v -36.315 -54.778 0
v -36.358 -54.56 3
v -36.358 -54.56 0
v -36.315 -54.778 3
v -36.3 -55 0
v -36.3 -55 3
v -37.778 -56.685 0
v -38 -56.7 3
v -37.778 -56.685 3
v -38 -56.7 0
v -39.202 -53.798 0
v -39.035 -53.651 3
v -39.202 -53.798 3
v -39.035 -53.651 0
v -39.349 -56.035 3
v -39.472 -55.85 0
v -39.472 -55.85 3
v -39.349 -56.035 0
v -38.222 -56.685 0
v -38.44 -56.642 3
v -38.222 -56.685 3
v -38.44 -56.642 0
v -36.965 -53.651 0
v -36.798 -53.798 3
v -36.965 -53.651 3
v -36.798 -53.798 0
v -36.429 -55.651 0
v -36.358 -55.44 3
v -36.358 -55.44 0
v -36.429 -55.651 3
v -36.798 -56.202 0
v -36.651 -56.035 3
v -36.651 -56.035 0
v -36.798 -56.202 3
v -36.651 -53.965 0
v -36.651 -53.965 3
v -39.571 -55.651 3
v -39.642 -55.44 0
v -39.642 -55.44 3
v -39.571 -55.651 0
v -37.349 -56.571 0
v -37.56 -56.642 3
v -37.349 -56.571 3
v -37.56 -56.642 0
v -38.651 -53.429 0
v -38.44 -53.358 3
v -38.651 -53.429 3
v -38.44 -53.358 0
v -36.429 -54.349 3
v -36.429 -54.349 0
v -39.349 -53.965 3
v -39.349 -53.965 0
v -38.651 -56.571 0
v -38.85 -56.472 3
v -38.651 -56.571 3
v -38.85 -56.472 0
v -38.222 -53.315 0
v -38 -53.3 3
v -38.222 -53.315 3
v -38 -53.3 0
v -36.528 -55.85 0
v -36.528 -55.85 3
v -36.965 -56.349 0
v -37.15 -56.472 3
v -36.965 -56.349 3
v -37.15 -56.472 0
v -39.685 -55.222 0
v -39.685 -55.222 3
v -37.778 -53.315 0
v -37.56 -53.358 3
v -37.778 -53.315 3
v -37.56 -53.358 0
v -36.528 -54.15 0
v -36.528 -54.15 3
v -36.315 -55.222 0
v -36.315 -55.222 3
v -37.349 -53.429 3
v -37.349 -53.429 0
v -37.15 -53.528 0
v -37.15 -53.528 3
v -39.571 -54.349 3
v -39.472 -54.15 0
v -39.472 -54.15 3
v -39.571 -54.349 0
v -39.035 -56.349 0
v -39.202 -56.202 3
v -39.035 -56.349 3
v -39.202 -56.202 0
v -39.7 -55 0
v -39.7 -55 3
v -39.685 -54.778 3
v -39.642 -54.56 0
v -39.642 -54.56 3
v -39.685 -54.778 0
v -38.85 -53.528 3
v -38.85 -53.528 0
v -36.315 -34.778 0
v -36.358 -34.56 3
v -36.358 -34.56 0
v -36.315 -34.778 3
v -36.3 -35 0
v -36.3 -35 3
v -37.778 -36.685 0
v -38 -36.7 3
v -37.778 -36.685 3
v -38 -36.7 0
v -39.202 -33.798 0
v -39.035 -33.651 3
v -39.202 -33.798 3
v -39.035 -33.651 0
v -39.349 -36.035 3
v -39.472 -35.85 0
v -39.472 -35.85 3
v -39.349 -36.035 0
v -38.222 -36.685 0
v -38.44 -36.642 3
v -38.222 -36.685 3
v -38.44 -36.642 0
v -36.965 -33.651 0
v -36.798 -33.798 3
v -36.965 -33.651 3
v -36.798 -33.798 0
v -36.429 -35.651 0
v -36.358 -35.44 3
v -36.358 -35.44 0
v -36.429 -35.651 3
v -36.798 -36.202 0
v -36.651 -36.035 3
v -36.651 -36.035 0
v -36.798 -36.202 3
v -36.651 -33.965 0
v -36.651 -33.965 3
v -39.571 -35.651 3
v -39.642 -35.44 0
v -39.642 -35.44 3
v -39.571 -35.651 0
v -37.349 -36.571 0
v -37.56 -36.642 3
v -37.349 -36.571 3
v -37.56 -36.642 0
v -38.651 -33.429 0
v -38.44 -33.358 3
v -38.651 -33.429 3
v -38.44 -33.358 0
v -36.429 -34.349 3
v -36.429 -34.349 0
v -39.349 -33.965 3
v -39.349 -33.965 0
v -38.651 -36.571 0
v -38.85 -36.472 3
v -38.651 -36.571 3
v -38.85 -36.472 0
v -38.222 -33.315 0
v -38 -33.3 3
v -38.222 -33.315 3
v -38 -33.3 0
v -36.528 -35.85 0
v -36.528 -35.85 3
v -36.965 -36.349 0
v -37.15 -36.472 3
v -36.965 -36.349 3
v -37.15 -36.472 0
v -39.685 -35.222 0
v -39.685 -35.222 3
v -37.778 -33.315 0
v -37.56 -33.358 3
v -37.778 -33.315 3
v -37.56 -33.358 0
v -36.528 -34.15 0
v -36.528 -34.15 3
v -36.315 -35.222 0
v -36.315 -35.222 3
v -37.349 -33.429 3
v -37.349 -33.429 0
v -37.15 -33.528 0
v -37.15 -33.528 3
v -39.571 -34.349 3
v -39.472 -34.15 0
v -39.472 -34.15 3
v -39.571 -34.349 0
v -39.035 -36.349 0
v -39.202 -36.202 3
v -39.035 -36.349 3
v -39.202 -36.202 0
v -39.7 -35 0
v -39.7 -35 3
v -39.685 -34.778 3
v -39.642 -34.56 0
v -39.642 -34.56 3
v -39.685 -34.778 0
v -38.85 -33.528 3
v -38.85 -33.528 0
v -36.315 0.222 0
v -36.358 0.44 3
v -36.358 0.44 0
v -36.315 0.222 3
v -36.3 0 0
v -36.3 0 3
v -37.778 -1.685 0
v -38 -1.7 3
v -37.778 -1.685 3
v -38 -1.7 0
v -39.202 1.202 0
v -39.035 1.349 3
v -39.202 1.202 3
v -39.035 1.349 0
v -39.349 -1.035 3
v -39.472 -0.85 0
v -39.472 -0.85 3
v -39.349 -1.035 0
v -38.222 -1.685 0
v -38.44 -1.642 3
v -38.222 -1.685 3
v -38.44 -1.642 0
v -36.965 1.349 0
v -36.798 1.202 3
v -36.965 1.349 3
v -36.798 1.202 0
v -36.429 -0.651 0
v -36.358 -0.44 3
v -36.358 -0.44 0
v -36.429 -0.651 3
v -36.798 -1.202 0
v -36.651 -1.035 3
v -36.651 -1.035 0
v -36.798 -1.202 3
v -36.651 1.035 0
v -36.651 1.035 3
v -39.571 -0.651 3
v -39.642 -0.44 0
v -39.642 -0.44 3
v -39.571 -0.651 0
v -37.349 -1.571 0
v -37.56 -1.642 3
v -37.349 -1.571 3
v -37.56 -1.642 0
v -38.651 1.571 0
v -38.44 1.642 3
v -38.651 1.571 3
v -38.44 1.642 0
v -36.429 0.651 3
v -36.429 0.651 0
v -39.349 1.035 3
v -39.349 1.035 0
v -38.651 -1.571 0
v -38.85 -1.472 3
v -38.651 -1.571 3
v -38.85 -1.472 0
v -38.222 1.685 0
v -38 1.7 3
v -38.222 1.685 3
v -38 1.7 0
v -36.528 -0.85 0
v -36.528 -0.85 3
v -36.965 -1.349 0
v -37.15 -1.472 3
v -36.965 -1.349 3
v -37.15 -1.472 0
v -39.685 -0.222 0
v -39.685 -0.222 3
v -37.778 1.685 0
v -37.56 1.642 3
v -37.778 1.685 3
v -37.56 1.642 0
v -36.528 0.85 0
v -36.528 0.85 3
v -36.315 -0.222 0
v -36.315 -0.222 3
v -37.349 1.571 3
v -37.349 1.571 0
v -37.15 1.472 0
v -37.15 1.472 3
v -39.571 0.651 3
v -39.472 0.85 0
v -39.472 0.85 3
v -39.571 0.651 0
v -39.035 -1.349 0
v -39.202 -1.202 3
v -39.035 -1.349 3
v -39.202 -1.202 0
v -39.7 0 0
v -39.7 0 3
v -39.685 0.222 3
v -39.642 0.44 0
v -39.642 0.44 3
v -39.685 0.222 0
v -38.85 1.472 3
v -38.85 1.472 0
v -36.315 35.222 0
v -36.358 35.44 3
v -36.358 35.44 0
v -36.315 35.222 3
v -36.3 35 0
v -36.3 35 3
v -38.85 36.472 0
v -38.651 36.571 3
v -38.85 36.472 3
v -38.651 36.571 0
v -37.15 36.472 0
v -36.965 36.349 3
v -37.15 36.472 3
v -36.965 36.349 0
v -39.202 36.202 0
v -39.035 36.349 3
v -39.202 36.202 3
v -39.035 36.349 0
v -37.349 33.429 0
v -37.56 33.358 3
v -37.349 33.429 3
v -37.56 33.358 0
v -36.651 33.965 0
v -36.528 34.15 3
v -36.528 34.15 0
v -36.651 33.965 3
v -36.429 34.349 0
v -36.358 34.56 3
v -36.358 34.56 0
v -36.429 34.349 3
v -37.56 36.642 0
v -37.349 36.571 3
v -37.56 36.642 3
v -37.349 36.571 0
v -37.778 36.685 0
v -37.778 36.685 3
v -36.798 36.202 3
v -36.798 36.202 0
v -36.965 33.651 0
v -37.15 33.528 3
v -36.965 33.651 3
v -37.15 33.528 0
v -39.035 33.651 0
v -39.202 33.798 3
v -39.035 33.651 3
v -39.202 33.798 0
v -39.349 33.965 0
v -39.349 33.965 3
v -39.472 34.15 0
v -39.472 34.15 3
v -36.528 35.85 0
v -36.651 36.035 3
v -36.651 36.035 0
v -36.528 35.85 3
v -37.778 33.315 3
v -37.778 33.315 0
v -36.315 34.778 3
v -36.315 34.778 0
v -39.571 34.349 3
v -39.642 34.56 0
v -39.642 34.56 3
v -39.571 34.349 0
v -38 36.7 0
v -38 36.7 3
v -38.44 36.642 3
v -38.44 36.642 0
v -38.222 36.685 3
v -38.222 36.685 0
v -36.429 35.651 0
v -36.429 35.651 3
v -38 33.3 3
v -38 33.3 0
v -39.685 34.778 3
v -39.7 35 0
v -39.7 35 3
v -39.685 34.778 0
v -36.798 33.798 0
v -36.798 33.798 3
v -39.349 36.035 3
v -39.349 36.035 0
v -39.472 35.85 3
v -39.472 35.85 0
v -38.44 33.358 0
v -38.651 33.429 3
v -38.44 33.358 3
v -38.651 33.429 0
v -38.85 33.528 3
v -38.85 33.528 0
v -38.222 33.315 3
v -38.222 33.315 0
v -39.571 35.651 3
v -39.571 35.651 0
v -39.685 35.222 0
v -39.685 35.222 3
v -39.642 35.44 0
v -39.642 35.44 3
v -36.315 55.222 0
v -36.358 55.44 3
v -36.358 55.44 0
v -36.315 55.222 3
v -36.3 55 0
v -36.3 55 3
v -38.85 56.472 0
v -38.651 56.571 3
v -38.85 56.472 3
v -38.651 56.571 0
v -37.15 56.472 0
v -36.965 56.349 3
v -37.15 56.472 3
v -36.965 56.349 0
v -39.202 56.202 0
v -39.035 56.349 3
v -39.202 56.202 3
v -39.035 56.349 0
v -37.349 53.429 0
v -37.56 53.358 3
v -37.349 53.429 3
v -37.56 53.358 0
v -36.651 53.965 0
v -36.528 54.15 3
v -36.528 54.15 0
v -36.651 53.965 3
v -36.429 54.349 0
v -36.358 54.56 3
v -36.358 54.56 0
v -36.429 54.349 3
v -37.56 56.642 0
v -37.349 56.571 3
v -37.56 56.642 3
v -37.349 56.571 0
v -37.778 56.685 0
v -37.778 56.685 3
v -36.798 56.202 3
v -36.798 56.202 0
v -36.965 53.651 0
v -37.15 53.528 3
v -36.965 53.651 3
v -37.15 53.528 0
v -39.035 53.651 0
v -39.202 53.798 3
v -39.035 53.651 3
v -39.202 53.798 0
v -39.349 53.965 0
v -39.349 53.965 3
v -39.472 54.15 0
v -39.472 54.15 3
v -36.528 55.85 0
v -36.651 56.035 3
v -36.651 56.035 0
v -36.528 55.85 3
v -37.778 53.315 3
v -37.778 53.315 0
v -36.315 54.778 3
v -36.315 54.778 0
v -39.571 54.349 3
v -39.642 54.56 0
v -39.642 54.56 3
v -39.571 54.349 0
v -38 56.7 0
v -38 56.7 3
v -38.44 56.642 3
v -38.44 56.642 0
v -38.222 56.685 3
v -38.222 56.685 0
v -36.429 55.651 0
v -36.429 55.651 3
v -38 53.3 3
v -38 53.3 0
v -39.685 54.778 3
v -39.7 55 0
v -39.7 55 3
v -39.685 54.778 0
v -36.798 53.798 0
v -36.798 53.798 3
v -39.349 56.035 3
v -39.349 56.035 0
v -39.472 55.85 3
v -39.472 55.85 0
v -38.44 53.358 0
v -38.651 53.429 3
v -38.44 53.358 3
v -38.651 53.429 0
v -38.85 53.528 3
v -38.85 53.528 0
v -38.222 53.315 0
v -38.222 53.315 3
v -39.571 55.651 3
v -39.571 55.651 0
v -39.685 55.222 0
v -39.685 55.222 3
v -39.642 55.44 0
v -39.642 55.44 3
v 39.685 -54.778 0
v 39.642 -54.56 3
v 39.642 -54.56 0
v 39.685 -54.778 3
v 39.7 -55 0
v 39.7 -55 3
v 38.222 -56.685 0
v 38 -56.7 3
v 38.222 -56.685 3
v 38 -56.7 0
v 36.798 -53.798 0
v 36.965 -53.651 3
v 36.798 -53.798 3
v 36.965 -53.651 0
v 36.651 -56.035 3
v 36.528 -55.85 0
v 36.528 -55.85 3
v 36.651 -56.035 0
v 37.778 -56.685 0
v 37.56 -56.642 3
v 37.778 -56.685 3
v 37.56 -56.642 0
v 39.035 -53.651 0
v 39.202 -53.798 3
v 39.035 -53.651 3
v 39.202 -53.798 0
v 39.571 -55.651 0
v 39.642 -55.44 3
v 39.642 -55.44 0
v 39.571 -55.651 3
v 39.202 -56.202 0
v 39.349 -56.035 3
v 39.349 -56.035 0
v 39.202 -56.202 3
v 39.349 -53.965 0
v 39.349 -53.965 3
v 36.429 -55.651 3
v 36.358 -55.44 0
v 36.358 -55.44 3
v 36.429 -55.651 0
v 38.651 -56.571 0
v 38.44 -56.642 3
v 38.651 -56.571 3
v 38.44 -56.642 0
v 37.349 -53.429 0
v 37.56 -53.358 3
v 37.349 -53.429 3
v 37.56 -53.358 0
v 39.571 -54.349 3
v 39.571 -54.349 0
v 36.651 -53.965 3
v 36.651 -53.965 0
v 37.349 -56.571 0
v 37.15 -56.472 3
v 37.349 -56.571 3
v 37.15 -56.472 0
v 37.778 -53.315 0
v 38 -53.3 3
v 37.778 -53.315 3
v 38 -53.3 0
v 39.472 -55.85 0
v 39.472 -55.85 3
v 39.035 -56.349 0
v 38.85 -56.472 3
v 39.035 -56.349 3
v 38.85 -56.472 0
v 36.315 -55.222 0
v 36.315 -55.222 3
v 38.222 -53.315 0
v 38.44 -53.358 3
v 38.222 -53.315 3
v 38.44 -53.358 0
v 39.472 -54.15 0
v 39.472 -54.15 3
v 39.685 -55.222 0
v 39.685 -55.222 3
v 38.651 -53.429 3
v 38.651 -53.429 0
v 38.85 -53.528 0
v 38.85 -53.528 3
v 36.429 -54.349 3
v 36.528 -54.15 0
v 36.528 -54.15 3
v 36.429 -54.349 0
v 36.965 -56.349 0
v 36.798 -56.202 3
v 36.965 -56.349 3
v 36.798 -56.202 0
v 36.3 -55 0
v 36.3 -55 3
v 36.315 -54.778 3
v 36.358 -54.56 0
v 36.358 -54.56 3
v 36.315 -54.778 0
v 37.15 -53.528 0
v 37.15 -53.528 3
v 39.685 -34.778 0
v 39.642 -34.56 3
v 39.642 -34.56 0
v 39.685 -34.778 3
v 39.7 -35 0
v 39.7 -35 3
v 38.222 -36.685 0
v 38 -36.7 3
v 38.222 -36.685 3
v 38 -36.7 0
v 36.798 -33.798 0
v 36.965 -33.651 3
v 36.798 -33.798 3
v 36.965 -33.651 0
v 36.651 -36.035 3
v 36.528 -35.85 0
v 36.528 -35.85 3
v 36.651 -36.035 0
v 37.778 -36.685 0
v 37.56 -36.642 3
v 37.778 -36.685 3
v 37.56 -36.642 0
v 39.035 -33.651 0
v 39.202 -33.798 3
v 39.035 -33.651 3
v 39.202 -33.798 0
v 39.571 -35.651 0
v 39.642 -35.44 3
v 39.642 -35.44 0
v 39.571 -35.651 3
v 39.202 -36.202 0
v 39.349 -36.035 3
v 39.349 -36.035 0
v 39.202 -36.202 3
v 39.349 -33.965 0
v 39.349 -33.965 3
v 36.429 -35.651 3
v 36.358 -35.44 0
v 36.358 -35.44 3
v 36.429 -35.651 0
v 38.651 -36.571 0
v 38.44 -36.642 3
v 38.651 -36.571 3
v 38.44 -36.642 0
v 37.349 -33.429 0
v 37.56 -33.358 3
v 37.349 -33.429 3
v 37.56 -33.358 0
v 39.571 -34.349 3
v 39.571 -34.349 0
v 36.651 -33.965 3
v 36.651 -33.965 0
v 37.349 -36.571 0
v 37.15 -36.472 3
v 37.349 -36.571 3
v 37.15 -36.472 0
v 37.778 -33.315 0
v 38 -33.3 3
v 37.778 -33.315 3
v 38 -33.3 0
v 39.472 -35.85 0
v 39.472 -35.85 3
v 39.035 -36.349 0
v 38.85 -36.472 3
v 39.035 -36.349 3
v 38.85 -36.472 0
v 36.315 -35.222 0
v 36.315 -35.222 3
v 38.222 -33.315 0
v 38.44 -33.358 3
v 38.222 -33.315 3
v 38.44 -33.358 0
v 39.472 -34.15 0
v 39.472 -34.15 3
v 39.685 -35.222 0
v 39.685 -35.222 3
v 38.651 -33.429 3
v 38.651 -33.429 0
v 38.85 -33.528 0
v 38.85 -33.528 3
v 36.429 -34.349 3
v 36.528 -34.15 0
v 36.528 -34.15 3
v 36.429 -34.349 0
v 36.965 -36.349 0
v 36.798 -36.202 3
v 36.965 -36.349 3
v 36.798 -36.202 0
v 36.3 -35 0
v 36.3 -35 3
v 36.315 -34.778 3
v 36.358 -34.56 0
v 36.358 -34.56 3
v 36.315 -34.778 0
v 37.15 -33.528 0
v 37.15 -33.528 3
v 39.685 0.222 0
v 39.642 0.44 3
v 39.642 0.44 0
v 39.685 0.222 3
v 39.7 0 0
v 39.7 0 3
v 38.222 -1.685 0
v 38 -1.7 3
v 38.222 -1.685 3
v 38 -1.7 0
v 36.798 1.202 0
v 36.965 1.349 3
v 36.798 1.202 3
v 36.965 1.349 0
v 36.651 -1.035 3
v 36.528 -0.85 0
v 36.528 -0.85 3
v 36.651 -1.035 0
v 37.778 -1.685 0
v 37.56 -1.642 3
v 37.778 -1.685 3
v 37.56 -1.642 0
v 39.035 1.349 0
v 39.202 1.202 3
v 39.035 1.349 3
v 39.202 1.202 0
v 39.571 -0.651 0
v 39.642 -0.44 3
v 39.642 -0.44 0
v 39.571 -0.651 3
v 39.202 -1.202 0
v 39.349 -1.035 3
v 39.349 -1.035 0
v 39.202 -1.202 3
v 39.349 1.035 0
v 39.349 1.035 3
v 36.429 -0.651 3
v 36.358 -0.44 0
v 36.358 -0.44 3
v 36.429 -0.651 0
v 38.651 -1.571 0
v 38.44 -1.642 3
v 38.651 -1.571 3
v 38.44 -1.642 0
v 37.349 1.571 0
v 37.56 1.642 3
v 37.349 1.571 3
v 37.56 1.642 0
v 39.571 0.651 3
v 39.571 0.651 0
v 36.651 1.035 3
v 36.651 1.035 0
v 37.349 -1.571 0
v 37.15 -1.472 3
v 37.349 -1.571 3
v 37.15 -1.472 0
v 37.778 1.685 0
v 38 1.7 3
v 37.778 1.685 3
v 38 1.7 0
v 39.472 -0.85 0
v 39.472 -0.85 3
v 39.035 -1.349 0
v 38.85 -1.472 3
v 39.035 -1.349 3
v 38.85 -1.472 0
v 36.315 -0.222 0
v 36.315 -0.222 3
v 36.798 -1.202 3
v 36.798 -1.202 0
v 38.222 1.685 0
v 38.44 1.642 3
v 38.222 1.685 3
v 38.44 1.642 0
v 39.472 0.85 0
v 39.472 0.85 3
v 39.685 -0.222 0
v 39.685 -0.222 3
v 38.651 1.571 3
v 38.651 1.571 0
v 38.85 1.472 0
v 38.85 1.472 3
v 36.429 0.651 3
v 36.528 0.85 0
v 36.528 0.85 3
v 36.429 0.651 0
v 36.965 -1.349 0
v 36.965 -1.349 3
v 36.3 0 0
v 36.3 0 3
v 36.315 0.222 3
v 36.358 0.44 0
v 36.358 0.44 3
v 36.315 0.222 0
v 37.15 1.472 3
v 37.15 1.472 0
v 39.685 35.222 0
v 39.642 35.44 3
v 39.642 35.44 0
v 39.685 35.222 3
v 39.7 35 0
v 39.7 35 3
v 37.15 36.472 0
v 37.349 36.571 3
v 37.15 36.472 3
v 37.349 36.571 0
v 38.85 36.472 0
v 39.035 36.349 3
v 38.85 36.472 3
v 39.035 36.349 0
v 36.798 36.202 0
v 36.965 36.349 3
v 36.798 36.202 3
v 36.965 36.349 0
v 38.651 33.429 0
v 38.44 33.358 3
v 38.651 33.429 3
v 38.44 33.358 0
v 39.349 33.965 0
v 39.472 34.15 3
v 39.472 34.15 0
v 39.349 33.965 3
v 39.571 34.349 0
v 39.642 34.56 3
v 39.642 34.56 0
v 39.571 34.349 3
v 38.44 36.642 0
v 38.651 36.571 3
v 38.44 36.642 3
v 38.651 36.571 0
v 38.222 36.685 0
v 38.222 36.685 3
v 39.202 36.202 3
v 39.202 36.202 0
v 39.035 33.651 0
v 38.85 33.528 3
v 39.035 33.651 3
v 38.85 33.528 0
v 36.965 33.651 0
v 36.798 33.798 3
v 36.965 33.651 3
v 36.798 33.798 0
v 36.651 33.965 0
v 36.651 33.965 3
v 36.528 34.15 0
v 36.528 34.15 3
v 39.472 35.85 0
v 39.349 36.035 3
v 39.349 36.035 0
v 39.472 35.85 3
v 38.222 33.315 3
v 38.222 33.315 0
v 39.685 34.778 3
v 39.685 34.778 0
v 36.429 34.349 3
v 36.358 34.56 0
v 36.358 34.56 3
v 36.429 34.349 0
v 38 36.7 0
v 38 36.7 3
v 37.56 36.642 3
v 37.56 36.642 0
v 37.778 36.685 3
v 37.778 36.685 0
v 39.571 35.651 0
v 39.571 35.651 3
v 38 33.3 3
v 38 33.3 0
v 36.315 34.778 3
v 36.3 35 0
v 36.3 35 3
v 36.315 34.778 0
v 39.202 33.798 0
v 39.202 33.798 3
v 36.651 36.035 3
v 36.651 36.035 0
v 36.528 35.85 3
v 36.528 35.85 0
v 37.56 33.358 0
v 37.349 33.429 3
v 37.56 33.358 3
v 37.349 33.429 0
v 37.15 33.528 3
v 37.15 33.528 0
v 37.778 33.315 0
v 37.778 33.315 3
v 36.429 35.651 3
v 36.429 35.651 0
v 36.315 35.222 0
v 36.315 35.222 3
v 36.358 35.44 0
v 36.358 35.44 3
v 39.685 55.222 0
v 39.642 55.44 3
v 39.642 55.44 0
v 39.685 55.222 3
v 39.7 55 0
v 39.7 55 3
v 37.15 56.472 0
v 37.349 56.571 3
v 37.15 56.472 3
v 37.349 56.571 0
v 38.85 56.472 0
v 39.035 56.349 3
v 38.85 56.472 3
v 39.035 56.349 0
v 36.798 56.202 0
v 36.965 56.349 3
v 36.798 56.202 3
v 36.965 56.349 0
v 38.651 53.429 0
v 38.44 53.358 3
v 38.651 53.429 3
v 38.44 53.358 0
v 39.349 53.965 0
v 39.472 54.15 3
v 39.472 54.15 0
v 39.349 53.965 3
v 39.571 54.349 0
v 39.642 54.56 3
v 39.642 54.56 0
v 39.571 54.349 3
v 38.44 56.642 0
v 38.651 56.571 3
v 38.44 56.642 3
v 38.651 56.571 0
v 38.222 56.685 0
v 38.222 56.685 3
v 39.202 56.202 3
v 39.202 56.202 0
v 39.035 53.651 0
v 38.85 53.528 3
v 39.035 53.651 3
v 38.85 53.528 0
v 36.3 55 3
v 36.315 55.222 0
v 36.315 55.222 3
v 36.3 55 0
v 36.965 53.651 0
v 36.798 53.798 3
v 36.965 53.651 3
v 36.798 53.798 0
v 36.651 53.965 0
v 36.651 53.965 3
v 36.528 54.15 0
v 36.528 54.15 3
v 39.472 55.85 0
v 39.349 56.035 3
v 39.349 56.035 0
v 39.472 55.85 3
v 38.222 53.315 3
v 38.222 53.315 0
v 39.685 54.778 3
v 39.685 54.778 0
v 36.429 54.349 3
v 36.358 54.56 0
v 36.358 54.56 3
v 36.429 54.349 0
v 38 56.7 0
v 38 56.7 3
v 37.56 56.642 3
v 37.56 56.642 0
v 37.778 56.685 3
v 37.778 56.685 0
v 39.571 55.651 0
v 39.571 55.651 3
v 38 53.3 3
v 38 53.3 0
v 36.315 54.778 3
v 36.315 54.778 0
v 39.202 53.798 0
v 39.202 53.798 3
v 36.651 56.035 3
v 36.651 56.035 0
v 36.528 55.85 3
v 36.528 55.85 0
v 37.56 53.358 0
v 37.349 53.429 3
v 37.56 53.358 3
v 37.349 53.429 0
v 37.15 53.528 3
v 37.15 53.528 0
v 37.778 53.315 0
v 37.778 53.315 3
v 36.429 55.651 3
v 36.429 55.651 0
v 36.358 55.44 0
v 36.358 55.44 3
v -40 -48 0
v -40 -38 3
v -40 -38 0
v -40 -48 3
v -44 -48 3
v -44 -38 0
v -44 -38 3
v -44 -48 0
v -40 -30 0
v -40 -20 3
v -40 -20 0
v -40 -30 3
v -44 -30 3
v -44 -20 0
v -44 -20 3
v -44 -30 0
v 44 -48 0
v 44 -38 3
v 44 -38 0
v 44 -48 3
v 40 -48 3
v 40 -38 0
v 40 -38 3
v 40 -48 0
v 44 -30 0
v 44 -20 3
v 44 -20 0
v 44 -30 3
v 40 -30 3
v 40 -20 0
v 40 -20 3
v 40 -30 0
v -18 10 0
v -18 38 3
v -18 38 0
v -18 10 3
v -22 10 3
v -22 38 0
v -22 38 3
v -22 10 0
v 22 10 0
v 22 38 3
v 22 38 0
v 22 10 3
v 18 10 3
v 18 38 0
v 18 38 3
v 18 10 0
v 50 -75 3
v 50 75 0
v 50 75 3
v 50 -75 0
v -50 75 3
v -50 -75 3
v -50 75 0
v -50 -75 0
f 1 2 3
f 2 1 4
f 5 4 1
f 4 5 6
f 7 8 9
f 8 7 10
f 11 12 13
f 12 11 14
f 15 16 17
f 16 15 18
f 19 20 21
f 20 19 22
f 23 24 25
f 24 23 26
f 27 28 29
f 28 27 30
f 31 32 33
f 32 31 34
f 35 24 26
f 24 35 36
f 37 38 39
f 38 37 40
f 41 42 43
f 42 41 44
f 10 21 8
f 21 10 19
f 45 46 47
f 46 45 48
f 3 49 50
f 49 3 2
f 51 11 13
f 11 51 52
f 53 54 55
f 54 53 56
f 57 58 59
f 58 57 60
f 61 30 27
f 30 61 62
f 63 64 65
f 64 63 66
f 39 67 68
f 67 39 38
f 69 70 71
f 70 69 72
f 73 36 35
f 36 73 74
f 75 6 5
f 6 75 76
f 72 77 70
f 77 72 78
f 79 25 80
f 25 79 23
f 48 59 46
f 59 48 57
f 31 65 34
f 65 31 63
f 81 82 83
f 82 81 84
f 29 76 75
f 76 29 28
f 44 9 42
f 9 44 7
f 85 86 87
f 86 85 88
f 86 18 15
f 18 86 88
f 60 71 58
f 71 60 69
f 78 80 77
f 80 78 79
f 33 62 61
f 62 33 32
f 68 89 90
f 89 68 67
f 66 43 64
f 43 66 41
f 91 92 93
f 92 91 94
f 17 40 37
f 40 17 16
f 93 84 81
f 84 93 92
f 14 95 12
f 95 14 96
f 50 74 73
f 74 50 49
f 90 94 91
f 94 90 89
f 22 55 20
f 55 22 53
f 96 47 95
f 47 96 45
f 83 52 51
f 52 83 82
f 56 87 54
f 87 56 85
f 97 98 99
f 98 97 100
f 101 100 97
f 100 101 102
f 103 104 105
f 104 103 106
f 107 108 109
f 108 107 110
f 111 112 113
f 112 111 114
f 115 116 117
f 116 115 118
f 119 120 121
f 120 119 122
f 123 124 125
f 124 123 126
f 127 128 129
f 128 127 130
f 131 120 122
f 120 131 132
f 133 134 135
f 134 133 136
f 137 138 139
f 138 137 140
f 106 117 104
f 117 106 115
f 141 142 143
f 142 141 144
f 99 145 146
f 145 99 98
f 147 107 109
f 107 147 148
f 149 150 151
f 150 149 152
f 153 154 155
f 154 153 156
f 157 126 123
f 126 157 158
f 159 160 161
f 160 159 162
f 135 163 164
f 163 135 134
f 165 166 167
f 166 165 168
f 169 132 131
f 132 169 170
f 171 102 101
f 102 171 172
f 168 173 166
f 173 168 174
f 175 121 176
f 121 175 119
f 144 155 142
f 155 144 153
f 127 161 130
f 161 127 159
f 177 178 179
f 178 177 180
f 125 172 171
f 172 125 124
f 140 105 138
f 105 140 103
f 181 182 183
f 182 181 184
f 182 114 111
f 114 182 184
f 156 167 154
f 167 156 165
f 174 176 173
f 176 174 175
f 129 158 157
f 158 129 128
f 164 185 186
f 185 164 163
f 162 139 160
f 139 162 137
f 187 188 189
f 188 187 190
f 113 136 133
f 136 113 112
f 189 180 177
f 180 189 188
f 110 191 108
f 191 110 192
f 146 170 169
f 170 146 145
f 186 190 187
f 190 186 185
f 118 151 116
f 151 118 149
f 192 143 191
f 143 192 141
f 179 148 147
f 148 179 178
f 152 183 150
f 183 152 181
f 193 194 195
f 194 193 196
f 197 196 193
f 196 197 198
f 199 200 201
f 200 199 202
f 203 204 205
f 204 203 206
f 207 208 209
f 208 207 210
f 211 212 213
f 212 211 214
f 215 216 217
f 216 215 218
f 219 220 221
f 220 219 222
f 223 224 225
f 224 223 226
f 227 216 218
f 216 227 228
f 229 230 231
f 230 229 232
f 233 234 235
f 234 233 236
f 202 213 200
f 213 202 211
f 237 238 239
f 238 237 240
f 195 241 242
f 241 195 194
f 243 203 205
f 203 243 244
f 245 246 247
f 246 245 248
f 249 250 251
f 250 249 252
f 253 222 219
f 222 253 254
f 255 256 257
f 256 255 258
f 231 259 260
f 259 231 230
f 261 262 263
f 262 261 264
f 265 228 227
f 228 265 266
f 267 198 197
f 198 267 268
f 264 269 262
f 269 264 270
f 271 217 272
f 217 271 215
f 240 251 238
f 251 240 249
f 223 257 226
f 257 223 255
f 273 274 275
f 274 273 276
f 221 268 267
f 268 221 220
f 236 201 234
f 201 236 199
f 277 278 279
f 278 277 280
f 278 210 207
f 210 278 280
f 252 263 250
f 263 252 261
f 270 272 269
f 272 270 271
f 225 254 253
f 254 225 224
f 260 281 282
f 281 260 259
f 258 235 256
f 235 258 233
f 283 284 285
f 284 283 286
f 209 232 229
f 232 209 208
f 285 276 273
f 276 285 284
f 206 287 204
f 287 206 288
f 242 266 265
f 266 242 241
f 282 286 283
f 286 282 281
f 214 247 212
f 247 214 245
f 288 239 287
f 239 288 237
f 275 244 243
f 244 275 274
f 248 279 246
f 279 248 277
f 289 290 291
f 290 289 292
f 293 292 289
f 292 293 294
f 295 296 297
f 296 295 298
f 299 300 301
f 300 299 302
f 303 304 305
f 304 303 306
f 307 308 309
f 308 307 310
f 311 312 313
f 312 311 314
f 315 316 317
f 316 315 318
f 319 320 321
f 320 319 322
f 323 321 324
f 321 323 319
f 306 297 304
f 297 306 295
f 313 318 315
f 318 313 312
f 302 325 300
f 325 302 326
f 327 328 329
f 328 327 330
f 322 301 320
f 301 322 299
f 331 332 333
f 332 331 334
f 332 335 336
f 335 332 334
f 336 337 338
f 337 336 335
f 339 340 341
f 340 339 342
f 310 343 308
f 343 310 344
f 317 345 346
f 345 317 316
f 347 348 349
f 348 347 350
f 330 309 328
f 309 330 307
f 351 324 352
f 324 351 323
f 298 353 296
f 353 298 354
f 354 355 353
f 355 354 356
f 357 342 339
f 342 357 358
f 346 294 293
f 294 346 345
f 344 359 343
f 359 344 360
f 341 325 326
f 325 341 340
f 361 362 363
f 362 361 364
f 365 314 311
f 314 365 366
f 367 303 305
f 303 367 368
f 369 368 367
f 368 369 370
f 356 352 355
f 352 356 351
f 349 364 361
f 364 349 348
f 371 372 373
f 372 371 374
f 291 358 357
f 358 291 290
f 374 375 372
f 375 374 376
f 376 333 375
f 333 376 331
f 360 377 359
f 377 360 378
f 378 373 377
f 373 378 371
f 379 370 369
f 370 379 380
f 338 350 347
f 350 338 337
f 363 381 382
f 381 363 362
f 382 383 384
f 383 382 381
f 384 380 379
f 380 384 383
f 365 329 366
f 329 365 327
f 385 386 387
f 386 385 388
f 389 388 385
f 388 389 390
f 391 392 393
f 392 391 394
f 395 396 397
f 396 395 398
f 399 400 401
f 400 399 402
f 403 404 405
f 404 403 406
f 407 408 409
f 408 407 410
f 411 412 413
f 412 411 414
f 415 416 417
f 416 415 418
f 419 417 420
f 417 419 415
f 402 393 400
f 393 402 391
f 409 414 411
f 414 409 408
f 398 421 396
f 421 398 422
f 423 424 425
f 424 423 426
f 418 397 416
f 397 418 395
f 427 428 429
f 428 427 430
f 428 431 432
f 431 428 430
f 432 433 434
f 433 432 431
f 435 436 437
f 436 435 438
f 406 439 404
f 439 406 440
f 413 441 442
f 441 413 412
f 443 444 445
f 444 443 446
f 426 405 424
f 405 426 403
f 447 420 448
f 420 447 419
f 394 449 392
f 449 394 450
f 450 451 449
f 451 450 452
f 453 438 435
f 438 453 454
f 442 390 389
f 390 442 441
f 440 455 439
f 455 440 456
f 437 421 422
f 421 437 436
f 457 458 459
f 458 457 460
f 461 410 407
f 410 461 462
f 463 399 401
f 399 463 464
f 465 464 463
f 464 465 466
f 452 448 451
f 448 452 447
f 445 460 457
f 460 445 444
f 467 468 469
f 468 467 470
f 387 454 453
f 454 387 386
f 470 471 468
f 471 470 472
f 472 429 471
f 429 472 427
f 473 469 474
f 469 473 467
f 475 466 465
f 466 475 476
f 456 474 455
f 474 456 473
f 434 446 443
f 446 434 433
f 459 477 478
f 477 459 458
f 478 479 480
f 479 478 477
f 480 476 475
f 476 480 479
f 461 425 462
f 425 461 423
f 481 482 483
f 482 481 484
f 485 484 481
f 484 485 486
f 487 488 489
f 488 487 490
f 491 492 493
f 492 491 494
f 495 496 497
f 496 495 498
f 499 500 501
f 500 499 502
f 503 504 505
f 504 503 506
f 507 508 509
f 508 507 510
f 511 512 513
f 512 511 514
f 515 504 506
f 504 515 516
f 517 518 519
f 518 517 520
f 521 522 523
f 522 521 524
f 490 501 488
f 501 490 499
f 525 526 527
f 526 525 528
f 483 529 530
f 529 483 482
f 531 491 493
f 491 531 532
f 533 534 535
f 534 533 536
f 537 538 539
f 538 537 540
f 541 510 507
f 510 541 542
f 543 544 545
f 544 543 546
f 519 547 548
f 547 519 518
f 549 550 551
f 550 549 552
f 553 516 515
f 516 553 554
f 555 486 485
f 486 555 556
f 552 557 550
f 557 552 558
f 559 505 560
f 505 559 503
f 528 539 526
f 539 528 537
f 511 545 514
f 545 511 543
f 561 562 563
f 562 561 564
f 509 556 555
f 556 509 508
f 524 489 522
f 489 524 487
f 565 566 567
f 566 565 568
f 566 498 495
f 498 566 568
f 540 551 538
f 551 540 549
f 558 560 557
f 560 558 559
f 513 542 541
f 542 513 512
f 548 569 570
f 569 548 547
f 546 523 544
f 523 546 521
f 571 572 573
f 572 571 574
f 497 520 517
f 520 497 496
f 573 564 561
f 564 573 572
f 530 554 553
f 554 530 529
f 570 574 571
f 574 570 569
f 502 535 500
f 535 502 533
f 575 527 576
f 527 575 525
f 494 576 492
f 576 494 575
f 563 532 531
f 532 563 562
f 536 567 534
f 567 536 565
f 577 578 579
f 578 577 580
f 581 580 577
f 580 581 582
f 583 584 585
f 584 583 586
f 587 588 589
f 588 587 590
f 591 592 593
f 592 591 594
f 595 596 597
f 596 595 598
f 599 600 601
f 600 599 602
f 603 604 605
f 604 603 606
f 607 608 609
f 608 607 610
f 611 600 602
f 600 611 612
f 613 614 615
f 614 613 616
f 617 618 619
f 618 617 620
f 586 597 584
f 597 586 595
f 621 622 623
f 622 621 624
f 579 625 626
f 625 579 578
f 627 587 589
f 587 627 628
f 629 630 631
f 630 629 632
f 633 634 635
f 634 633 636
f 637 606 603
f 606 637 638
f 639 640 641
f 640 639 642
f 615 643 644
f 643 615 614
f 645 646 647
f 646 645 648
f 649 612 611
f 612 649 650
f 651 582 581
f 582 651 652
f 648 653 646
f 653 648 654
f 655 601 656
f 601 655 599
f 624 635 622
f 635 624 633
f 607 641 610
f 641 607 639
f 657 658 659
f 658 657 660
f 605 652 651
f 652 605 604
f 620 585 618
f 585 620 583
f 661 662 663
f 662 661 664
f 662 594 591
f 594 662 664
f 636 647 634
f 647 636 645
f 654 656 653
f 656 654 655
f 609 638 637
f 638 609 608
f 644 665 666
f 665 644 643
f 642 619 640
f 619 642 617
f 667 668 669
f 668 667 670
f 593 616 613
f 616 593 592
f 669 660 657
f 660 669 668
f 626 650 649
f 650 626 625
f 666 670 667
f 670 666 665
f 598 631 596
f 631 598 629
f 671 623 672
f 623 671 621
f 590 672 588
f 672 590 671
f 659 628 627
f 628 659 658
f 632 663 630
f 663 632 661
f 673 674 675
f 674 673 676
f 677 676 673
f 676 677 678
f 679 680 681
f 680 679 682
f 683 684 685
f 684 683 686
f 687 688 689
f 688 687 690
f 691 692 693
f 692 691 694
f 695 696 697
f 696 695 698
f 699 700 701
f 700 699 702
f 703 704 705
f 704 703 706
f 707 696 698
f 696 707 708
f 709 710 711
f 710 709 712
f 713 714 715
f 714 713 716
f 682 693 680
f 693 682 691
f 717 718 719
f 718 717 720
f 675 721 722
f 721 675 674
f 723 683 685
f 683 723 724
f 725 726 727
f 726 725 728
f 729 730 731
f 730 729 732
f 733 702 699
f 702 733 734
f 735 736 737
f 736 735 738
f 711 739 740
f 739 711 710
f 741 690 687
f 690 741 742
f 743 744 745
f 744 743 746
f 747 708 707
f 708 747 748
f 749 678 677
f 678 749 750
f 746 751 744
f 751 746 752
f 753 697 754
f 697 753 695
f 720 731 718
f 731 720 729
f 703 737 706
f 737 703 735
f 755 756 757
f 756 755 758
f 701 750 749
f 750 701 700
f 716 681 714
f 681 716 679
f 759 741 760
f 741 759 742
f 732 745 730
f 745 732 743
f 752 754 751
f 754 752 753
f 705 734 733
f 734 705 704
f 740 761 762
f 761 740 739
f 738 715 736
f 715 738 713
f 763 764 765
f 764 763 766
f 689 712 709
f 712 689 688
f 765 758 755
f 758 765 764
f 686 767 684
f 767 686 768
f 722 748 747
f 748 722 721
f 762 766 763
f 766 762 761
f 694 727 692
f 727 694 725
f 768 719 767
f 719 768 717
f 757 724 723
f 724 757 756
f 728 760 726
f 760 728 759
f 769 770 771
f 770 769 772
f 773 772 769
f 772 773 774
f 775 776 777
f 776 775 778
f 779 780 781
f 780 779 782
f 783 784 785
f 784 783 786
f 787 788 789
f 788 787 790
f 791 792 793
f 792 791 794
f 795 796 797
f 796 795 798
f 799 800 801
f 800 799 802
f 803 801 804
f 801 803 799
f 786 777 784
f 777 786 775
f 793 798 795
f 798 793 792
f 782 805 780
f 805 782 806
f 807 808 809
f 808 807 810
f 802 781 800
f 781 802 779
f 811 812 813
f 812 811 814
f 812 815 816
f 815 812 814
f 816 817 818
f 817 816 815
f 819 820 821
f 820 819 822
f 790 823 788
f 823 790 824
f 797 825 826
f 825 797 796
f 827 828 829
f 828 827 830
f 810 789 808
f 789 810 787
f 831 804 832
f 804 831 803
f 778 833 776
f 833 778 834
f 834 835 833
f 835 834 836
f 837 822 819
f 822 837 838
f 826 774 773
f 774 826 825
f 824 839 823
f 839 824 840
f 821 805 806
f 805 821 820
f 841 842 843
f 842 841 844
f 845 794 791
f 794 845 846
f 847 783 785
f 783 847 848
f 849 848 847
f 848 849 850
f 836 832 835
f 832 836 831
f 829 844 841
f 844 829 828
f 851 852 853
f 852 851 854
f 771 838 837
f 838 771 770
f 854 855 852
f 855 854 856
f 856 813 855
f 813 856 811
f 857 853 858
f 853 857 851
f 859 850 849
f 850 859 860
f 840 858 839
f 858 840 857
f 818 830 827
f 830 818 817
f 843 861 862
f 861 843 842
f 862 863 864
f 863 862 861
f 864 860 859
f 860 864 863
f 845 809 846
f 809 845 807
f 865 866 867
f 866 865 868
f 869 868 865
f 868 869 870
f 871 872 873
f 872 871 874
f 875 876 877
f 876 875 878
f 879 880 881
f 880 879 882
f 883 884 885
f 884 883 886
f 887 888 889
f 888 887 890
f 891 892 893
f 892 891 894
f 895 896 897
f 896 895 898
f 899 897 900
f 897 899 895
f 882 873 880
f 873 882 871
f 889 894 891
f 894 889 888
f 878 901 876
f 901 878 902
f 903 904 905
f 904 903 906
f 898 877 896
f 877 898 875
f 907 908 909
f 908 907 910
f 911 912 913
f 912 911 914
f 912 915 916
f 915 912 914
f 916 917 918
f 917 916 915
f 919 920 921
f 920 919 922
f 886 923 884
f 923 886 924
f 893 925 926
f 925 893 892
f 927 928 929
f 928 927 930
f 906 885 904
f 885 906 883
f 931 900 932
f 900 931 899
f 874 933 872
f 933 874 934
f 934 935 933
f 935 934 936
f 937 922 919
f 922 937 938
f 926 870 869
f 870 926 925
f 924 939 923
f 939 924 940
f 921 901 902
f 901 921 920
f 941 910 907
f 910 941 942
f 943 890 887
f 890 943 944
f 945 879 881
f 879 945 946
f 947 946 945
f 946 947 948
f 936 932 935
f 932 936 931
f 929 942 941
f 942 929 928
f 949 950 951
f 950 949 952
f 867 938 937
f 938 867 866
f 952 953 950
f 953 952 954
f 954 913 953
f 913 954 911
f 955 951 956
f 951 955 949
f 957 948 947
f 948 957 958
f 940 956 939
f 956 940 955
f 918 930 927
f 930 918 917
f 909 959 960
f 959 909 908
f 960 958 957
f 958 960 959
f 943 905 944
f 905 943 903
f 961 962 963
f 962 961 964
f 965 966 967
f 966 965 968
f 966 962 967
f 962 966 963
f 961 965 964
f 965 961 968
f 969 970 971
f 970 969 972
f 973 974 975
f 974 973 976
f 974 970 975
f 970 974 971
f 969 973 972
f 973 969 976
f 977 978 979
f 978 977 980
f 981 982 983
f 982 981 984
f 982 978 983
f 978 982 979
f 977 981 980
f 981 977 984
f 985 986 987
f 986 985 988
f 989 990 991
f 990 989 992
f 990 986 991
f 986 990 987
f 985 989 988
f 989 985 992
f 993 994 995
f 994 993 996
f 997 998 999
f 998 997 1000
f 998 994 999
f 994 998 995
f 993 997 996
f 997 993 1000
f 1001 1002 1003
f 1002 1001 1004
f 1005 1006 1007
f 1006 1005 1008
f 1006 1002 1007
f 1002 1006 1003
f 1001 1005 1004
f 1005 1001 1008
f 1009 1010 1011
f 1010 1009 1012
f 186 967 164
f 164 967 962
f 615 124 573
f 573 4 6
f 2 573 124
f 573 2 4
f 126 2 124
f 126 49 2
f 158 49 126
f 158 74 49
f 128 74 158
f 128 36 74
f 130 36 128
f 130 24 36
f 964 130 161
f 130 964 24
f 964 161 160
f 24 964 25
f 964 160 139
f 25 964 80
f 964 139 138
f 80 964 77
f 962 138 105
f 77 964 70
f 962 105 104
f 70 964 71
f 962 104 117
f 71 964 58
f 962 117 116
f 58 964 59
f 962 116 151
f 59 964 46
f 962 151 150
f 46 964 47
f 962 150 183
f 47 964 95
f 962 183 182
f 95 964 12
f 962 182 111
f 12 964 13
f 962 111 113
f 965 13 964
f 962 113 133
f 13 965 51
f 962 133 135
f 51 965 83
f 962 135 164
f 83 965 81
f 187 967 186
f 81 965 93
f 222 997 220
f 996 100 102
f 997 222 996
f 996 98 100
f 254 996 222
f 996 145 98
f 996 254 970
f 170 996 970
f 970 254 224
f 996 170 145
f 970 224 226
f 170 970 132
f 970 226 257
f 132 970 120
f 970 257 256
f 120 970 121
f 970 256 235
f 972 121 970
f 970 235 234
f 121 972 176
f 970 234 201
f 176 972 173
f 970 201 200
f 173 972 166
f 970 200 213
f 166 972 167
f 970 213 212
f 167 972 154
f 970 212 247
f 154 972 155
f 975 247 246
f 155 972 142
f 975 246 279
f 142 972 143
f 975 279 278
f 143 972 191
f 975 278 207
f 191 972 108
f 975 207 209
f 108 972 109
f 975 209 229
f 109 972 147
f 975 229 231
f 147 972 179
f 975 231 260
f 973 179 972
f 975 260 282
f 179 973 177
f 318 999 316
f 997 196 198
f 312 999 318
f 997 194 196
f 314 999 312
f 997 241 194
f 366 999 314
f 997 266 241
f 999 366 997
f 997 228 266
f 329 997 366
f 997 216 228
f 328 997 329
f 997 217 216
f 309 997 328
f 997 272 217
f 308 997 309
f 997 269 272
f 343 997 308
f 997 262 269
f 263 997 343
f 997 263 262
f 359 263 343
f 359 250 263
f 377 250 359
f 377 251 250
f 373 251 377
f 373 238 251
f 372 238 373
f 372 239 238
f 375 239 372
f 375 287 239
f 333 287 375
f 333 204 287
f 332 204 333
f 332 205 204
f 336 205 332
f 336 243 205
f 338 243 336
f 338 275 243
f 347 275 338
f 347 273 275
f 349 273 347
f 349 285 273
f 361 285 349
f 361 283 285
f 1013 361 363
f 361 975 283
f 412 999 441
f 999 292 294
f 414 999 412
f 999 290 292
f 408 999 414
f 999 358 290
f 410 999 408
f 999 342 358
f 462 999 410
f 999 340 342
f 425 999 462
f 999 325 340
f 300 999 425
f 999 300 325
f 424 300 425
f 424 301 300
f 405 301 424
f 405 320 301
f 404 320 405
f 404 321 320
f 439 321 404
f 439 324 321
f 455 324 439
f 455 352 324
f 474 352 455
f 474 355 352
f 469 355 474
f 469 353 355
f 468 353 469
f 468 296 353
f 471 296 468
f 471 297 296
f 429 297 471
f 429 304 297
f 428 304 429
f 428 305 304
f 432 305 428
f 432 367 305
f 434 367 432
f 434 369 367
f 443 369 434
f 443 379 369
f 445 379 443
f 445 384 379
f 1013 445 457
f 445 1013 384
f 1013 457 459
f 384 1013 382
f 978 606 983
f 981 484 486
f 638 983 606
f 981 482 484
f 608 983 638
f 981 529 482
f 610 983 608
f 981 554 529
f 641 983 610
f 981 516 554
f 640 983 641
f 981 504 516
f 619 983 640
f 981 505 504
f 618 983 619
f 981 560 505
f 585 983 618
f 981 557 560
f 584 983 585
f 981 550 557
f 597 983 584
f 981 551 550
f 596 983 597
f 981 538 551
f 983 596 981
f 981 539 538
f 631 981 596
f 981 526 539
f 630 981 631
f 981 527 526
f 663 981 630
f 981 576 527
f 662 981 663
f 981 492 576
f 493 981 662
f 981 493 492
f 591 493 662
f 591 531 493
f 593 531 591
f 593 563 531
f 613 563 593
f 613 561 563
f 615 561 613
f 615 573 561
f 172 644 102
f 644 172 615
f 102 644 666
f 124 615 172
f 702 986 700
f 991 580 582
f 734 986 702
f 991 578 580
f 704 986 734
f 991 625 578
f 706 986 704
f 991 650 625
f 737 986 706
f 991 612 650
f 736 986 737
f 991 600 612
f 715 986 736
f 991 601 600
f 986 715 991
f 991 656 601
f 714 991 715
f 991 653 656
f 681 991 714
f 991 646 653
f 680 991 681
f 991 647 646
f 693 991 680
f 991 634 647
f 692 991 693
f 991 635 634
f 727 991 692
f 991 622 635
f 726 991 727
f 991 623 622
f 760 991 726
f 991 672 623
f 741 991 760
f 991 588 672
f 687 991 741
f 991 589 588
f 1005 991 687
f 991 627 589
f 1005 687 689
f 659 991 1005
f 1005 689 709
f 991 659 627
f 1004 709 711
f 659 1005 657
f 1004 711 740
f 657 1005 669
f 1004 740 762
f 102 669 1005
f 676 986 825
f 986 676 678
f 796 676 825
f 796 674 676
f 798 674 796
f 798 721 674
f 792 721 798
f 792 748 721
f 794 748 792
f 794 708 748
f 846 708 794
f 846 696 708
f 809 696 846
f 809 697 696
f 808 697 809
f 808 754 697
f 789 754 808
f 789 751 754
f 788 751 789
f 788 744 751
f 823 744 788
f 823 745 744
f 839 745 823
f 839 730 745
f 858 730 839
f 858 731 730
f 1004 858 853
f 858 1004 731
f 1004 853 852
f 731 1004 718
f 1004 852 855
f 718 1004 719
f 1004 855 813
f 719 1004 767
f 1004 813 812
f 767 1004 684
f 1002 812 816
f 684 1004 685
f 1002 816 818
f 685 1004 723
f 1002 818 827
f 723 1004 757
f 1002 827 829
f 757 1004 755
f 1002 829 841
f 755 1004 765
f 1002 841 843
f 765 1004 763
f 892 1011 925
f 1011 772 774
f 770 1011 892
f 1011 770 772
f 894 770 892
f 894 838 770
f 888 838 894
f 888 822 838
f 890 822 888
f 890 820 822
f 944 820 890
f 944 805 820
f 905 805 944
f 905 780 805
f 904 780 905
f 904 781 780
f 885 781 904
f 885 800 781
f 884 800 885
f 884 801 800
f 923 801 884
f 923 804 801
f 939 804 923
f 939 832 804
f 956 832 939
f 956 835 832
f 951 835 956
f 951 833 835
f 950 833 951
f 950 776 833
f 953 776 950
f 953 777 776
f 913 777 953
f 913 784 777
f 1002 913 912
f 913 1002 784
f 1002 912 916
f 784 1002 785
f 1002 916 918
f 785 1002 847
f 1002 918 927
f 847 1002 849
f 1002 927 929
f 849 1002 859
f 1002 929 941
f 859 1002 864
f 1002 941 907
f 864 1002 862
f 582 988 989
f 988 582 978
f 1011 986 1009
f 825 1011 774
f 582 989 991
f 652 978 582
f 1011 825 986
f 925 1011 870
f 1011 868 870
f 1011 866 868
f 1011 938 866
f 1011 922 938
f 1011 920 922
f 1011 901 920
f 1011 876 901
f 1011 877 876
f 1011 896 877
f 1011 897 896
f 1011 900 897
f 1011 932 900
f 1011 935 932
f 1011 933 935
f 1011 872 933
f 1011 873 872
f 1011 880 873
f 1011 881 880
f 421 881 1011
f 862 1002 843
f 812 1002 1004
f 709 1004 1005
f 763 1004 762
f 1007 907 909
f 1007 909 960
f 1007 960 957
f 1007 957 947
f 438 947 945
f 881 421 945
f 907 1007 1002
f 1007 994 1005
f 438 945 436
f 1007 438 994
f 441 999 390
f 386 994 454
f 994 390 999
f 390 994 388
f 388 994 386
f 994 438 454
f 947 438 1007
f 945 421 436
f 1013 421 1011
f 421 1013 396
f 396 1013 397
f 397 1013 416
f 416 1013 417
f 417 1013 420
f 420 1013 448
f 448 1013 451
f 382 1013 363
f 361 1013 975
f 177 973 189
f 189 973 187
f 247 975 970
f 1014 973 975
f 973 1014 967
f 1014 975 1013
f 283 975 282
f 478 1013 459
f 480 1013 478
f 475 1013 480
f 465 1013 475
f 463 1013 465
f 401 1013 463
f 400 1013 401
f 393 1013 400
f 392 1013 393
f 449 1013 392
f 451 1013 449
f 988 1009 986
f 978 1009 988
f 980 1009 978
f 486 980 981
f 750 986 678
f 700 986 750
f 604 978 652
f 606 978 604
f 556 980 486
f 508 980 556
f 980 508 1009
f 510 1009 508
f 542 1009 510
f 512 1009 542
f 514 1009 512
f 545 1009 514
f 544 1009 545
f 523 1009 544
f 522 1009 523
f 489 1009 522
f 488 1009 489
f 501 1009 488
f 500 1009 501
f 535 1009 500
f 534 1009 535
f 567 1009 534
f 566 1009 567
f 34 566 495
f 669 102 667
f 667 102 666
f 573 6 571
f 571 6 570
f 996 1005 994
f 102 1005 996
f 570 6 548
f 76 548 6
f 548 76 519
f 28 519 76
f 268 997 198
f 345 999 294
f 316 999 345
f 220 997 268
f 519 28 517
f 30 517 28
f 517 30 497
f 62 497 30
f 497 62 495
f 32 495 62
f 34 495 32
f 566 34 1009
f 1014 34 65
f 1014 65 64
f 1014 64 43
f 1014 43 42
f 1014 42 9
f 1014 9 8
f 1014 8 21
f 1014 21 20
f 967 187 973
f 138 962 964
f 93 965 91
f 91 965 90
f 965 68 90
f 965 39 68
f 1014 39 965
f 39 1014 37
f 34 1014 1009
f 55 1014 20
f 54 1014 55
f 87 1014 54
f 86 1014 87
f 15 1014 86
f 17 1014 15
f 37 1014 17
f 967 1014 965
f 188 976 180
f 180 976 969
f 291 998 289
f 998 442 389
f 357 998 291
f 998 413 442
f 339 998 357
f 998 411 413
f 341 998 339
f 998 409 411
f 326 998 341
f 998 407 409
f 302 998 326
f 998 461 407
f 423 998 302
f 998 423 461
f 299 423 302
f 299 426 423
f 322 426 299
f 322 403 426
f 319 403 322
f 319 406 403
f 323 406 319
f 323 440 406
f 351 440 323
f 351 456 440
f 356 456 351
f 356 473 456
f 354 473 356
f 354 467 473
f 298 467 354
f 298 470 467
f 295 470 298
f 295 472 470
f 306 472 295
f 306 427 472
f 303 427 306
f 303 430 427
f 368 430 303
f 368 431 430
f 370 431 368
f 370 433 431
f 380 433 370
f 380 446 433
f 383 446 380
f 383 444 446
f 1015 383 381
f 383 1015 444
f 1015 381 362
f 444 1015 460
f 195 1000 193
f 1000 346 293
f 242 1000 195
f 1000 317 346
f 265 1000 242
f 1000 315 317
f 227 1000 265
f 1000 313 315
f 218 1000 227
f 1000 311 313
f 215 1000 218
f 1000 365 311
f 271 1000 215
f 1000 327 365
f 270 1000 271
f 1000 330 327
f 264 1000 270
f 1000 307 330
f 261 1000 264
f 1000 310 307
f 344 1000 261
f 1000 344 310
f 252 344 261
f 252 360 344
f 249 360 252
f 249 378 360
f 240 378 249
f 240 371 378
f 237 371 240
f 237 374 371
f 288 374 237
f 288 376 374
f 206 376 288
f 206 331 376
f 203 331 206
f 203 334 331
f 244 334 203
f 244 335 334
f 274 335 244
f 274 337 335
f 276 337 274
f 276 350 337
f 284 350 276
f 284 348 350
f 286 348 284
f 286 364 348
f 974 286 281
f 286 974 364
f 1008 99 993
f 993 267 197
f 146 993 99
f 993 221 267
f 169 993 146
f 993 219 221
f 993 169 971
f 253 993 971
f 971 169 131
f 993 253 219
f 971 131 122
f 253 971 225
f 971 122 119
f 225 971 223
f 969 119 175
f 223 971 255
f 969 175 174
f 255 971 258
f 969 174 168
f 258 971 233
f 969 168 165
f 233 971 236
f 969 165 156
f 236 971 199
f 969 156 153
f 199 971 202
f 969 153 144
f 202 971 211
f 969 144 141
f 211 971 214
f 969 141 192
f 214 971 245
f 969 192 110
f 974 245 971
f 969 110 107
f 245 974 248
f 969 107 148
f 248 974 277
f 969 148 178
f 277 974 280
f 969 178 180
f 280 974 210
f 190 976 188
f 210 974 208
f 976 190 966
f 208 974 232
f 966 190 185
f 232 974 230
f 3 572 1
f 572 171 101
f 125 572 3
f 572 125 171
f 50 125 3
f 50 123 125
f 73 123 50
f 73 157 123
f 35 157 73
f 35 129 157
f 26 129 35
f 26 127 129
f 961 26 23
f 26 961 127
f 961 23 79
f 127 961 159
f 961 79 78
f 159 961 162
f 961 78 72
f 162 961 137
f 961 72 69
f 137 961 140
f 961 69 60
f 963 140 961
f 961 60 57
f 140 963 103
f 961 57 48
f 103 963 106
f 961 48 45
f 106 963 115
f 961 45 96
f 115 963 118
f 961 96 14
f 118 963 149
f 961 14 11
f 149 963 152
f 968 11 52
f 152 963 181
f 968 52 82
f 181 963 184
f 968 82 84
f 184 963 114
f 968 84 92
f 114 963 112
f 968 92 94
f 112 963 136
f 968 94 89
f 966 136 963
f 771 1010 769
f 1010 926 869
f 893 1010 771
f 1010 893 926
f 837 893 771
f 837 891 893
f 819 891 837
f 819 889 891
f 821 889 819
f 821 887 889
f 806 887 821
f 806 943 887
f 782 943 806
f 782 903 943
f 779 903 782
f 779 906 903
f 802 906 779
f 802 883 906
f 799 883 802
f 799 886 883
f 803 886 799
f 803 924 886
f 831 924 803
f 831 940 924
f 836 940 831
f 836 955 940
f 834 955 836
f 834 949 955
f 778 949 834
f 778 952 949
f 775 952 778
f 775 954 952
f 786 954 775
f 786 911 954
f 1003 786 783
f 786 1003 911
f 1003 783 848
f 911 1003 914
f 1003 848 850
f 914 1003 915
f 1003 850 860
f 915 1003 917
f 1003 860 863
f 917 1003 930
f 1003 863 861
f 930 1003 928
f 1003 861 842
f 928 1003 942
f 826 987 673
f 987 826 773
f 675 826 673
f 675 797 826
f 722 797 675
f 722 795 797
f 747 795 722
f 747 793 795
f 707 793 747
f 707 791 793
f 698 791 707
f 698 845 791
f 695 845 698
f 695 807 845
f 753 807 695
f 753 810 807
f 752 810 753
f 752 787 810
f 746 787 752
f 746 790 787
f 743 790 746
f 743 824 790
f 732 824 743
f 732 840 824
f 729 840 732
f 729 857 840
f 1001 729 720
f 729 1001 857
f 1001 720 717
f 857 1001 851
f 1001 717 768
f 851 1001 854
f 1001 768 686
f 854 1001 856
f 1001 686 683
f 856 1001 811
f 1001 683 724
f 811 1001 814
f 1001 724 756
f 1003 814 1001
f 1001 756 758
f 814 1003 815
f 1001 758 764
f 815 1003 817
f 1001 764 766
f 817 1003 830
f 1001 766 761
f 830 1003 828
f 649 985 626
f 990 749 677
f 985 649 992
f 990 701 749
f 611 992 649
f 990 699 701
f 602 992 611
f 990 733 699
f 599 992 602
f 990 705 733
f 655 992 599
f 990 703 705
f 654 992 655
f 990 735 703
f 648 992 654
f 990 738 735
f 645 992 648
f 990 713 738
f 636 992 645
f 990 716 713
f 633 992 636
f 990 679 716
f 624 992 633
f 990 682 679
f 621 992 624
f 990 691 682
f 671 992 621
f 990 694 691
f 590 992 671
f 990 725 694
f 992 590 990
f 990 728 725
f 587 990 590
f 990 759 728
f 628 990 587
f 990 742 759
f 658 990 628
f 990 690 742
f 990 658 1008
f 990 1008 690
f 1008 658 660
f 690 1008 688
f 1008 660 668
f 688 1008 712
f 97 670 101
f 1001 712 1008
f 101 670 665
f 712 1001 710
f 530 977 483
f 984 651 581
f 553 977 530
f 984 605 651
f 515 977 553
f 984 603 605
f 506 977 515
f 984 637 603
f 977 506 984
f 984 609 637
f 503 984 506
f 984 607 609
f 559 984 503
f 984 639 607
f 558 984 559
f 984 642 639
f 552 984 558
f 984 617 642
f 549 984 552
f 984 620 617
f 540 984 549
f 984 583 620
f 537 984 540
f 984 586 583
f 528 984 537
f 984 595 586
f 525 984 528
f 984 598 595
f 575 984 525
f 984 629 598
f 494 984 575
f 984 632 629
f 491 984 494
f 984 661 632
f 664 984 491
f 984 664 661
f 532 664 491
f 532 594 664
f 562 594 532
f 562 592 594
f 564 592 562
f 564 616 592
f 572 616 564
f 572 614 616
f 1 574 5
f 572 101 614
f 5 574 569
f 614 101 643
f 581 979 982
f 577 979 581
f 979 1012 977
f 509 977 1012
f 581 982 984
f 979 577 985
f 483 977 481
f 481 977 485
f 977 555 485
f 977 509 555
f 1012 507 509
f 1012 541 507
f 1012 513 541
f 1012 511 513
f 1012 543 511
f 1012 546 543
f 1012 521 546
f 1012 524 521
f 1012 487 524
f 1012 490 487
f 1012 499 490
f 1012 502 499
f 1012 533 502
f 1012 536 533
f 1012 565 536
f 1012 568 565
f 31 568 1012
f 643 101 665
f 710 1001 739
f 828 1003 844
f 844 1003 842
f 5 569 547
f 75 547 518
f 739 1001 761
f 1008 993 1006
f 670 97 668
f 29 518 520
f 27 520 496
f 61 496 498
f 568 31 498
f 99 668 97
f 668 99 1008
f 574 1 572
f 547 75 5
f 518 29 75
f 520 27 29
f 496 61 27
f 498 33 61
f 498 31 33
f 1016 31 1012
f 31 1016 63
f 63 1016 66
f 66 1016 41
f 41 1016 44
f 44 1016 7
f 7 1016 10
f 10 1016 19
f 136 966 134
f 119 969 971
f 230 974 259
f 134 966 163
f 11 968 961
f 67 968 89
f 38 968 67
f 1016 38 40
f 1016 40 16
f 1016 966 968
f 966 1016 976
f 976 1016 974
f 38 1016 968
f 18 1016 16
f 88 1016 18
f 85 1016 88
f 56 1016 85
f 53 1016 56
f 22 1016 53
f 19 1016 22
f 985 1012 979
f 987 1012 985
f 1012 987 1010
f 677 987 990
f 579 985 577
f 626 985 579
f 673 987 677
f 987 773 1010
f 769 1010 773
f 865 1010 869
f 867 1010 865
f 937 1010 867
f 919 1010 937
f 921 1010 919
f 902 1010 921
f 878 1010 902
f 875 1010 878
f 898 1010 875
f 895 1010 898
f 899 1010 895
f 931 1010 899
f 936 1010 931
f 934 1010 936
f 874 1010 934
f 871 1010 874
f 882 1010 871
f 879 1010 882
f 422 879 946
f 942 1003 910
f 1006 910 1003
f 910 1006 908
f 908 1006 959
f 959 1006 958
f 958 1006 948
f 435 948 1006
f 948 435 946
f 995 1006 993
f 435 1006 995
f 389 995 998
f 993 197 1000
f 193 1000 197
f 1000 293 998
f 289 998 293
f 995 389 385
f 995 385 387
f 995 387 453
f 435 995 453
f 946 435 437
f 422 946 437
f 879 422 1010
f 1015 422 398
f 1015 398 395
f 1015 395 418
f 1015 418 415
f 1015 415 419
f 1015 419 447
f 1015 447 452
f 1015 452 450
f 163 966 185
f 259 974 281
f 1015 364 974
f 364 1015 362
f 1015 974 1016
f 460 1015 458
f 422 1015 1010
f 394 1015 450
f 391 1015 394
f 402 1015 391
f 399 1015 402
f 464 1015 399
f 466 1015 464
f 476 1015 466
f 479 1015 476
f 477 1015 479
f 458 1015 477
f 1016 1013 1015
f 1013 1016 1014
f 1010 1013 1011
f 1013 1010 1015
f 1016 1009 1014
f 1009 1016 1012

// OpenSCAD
// SystemEdu 桌面探测车 2.0，单位 mm；未做实机制造验证。
// part: deck / strap / bumper / coupon。先打印 coupon 试配。
part="deck";
width=100; length=150; thickness=3; hole=3.4;
$fn=48;
module deck(){difference(){translate([-width/2,-length/2,0])cube([width,length,thickness]);for(x=[-width/2+12,width/2-12])for(y=[-55,-35,0,35,55])translate([x,y,-1])cylinder(h=thickness+2,d=hole);for(x=[-width/2+8,width/2-8])for(y=[-43,-25])translate([x-2,y-5,-1])cube([4,10,thickness+2]);for(x=[-20,20])translate([x-2,10,-1])cube([4,28,thickness+2]);}}
module strap(){difference(){cube([32,12,3]);for(x=[4,28])translate([x,6,-1])cylinder(h=5,d=hole);}}
module bumper(){union(){cube([width-16,12,3]);translate([0,9,0])cube([width-16,3,16]);}}
module coupon(){difference(){cube([60,16,3]);for(i=[0:4])translate([8+i*11,8,-1])cylinder(h=5,d=3+i*0.2);}}
if(part=="deck")deck();else if(part=="strap")strap();else if(part=="bumper")bumper();else coupon();
